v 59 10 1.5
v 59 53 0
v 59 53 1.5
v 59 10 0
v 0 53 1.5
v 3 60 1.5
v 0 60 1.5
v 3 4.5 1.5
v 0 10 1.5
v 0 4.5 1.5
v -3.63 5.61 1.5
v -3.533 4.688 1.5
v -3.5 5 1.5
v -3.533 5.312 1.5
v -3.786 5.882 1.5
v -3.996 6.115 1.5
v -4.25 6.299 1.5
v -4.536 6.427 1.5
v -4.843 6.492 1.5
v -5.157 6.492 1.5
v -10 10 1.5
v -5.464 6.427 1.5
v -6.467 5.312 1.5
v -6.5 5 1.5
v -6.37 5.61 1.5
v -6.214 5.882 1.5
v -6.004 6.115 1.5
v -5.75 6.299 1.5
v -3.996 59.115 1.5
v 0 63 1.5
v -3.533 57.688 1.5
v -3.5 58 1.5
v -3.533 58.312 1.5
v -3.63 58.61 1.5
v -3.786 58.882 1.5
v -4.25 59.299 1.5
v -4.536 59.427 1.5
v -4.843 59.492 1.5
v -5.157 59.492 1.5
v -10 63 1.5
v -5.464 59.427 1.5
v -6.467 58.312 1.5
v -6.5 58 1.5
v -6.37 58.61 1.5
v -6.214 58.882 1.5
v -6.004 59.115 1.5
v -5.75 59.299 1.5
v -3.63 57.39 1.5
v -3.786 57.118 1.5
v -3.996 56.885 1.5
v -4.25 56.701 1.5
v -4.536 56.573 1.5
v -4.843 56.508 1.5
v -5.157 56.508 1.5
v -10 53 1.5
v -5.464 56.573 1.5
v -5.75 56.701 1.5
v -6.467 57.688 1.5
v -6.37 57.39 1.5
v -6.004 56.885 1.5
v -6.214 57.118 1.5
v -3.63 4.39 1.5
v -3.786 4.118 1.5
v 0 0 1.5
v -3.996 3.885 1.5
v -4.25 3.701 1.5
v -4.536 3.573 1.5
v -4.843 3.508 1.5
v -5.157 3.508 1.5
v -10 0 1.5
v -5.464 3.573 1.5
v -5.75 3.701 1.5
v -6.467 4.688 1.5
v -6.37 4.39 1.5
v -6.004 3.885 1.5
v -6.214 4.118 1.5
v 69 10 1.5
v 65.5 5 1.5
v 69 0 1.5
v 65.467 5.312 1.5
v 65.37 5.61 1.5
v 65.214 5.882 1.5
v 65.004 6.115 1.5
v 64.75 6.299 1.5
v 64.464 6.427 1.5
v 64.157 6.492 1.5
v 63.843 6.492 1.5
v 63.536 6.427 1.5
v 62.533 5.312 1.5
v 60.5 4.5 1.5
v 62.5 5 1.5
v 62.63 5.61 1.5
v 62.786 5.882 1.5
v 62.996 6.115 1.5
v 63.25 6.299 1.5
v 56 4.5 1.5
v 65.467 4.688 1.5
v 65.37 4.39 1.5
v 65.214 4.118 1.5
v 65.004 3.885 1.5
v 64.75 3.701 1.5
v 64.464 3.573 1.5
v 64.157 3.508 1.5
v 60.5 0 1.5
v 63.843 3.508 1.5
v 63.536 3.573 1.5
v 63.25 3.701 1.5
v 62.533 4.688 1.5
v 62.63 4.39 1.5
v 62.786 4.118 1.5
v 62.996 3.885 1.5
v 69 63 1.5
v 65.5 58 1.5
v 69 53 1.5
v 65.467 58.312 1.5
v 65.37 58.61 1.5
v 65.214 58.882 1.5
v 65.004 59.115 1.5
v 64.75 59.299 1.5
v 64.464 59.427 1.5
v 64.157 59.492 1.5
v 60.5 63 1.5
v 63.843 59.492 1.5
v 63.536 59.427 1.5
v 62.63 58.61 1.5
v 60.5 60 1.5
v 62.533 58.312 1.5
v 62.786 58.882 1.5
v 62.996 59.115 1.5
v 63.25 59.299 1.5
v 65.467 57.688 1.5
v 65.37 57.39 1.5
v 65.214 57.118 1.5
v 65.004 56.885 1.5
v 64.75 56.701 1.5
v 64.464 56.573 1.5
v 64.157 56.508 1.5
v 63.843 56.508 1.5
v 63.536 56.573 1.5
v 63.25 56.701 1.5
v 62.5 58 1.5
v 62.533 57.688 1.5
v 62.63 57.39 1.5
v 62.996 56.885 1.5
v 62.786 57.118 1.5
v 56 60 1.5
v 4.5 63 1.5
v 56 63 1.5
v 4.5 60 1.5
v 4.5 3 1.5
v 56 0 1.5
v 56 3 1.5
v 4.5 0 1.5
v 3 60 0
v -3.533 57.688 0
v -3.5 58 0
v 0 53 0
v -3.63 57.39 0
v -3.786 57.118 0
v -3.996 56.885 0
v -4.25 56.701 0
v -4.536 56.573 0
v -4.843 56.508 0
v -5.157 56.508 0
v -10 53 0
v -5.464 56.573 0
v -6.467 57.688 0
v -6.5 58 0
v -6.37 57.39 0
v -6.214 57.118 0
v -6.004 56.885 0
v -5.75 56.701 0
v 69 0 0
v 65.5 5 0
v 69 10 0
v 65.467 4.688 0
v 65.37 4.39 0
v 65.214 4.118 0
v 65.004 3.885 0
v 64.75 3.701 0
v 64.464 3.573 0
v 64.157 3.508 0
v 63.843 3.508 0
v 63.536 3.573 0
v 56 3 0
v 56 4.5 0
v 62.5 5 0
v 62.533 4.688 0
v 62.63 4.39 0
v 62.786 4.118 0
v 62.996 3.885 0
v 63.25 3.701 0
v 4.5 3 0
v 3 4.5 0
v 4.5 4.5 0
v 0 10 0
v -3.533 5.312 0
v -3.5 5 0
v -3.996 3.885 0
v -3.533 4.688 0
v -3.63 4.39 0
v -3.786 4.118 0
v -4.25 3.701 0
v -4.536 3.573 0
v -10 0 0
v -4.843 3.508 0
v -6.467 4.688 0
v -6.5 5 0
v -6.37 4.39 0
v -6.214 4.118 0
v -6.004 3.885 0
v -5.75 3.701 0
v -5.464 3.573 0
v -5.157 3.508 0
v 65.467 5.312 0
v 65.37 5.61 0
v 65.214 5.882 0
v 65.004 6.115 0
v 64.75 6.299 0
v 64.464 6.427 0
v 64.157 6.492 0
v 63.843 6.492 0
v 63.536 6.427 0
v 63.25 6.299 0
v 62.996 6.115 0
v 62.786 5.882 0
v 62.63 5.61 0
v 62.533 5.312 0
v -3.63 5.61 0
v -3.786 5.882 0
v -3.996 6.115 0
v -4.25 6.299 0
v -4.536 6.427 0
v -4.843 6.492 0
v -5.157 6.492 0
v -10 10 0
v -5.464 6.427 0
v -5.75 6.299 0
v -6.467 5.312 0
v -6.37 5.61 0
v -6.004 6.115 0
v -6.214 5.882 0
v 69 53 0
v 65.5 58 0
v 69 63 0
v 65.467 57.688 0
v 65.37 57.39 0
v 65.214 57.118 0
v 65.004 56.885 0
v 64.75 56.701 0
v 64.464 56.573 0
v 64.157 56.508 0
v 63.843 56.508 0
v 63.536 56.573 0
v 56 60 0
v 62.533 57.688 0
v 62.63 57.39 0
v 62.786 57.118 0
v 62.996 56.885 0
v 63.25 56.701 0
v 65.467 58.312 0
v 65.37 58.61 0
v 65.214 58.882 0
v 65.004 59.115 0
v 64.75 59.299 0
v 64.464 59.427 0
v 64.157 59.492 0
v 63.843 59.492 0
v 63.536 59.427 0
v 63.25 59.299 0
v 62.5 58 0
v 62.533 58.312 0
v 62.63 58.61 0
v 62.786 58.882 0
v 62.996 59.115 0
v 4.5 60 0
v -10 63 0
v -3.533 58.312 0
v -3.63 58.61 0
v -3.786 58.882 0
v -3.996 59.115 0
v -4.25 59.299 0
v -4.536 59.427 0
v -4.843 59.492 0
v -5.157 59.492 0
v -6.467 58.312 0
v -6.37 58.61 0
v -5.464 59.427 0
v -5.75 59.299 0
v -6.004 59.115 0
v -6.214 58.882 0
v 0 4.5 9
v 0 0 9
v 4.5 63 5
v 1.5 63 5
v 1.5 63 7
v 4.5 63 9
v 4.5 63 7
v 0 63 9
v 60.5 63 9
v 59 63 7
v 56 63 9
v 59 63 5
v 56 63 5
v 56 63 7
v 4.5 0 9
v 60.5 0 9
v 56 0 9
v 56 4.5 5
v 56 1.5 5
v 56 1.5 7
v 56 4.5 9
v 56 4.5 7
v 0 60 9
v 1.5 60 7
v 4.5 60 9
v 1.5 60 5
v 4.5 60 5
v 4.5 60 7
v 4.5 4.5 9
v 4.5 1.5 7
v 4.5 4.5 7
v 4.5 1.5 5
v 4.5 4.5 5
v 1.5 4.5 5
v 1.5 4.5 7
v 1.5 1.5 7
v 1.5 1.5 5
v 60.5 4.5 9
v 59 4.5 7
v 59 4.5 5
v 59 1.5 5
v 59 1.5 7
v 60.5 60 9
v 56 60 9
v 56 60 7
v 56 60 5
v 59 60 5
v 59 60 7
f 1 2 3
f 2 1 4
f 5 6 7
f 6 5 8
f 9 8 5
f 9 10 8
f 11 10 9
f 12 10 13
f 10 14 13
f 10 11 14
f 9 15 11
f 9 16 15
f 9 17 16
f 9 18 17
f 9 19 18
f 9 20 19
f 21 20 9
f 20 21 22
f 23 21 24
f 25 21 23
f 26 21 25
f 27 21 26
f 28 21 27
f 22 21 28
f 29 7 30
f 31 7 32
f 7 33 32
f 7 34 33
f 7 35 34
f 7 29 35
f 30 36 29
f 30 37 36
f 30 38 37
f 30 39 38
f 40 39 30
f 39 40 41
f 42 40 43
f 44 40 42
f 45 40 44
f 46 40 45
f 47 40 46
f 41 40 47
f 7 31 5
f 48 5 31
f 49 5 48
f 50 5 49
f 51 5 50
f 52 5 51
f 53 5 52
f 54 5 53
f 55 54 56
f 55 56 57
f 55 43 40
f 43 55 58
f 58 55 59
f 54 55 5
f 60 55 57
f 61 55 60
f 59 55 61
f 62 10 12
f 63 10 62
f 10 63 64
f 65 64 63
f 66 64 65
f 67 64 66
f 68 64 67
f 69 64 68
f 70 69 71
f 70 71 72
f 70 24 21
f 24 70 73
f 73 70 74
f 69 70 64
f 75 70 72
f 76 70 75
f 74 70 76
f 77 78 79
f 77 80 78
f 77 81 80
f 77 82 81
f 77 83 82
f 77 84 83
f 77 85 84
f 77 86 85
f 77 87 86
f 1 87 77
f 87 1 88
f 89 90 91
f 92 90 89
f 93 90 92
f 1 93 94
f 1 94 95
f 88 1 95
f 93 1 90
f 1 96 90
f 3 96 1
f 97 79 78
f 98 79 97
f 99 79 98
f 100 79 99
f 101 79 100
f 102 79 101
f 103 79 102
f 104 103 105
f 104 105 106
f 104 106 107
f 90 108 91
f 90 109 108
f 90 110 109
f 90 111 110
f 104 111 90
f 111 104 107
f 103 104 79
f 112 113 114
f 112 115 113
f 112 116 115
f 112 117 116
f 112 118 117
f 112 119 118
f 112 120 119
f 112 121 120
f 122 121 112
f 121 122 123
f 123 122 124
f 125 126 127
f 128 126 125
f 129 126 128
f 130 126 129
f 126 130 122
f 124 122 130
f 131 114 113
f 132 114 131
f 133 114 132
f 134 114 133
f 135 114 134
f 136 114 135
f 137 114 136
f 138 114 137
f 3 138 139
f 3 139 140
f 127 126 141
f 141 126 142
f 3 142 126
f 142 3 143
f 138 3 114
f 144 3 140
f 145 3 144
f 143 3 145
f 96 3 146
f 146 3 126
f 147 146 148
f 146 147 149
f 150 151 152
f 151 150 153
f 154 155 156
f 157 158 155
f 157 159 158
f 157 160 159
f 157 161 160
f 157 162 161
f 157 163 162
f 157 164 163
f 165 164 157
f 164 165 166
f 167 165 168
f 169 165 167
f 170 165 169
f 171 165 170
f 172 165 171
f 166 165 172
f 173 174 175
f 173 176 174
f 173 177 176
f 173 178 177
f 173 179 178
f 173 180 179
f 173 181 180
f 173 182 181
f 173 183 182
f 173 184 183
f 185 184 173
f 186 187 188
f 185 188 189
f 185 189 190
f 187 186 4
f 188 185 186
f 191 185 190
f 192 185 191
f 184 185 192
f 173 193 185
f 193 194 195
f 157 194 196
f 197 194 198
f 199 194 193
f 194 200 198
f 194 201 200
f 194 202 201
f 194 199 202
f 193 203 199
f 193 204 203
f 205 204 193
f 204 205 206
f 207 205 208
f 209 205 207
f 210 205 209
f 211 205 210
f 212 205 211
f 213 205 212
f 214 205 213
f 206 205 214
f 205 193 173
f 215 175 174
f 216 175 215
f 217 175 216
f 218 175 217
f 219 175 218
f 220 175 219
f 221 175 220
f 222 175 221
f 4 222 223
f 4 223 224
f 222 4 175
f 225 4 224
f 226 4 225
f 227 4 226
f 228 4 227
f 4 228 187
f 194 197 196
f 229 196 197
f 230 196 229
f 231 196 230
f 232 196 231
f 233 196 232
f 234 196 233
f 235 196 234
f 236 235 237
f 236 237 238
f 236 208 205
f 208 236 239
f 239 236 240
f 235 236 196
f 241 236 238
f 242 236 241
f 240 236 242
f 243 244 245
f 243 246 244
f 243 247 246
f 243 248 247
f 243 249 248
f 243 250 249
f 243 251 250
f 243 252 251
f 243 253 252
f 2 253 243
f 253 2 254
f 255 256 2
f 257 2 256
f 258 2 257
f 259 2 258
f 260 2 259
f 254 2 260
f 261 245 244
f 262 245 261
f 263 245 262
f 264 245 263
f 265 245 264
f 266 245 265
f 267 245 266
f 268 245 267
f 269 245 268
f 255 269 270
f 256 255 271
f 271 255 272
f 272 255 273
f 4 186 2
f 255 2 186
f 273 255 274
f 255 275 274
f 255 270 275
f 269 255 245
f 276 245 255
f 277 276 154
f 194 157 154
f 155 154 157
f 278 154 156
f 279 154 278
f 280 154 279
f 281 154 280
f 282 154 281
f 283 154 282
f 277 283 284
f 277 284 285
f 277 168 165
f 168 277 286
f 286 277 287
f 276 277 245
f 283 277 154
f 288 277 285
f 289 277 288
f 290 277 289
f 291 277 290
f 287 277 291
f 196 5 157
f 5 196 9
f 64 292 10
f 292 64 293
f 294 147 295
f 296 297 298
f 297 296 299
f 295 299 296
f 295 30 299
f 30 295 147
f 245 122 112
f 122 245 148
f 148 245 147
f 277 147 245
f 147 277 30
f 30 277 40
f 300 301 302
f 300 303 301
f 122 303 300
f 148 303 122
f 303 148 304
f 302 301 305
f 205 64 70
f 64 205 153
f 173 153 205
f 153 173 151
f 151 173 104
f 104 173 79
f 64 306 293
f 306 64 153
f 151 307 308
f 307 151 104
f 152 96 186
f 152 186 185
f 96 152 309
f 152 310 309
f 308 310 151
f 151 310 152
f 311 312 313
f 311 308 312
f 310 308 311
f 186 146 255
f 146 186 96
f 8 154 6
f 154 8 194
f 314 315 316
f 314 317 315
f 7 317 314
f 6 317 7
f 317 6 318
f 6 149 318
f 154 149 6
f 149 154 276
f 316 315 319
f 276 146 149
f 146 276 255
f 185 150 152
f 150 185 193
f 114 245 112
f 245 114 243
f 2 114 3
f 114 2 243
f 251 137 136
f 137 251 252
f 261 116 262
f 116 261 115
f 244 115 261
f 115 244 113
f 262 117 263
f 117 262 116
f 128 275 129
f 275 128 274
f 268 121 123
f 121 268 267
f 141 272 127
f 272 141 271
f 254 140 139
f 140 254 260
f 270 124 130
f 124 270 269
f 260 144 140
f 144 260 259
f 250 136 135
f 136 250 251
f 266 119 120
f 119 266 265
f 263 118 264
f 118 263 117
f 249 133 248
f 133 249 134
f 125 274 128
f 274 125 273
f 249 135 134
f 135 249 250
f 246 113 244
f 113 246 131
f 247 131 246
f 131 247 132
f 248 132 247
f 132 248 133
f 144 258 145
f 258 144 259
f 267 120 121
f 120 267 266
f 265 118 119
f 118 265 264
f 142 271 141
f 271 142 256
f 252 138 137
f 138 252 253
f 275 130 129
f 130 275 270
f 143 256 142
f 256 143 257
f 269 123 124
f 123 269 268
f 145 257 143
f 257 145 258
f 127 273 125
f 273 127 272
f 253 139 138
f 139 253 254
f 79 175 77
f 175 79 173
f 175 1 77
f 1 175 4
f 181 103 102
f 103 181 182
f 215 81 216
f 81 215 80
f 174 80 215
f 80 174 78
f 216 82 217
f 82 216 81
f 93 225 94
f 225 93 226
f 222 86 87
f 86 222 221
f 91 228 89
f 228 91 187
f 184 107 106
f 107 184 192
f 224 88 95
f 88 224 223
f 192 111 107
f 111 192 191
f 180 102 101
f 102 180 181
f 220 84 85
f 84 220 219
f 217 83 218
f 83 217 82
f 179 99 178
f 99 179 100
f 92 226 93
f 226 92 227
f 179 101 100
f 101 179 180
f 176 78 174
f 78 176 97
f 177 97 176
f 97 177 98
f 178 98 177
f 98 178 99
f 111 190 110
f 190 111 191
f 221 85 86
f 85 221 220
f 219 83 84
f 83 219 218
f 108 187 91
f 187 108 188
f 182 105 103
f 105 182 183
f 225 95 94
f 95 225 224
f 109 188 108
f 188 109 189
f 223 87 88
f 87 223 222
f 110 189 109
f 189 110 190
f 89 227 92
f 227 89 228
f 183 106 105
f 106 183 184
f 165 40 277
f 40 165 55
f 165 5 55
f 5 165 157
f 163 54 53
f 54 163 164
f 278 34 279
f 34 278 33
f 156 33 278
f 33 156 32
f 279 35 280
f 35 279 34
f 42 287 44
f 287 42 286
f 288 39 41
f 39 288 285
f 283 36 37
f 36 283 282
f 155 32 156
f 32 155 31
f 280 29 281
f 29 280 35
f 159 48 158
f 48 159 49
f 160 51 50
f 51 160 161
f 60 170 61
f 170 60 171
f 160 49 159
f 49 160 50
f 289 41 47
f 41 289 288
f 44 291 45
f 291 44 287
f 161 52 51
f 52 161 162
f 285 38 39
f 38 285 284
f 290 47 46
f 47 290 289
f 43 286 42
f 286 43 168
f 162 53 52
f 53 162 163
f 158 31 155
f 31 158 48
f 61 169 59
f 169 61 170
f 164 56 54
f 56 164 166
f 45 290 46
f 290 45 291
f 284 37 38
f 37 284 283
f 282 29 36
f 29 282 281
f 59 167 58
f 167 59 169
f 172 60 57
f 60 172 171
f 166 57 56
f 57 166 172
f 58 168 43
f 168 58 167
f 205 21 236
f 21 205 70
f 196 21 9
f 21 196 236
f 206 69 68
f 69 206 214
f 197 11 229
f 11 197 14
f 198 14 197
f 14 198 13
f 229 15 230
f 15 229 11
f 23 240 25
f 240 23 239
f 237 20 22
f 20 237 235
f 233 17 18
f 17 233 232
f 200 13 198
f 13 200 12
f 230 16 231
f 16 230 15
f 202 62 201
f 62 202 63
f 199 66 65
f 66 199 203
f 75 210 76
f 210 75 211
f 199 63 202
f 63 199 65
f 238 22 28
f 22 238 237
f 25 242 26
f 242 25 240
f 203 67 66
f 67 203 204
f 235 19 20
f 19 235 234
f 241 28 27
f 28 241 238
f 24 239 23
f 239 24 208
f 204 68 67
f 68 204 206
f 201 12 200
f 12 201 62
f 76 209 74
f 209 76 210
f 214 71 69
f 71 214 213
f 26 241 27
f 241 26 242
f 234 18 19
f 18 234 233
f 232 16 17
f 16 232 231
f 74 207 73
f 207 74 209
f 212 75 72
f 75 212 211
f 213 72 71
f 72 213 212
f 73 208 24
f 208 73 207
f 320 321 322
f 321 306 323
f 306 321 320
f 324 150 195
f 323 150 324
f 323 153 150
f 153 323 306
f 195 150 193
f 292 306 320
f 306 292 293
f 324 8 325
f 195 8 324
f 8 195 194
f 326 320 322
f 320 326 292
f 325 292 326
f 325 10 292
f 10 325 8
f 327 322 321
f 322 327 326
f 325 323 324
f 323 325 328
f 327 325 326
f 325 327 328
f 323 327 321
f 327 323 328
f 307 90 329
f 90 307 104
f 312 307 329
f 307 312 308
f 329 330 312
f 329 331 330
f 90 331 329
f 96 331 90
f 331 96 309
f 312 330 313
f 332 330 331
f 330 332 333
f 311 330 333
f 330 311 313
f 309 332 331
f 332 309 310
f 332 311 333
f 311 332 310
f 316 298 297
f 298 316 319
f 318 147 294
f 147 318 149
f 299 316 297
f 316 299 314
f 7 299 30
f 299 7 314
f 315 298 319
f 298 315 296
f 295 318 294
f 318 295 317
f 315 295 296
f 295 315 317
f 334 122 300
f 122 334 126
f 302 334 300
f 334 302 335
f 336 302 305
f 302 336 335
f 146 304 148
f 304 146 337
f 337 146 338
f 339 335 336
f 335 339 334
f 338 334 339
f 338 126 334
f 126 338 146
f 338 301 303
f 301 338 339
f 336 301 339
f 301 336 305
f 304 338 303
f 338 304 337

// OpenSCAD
Wall=3;
Thickness=1.5;
Height=61.5+1.5;
Length=56+3;
$fs = 0.01;
difference () {
cube([Length,Height,Thickness]);
translate([Wall, Wall, 0]) cube([Length-Wall*2,Height-Wall*2,2]);
}
difference () {
  translate([Length,Height-10,0]) cube([10,10,Thickness]);
  translate([Length+5,Height+5-10,0]) cylinder(Thickness,1.5,1.5);
}

difference () {
  translate([Length,0,0]) cube([10,10,Thickness]);
  translate([Length+5,5,0]) cylinder(Thickness,1.5,1.5);
}

difference () {
  translate([-10,Height-10,0]) cube([10,10,Thickness]);
  translate([-10+5,Height-5,0]) cylinder(Thickness,1.5,1.5);
}

difference () {
  translate([-10,0,0]) cube([10,10,Thickness]);
  #translate([-10+5,5,0]) cylinder(Thickness,1.5,1.5);
}


//Relays
module relay(xx, yy) {
    translate([xx,yy,0]) difference () {cube([4.5,4.5,9]); translate([1.5,1.5,5]) cube([3,3,2]);}
    translate([xx+56,yy,0]) difference () {cube([4.5,4.5,9]); translate([0,1.5,5]) cube([3,3,2]);}
    translate([xx,yy+61.5-1.5,0]) difference () {cube([4.5,3,9]); translate([1.5,0,5]) cube([3,5,2]);}
    translate([xx+56,yy+61.5-1.5,0]) difference () {cube([4.5,3,9]); translate([0,0,5]) cube([3,5,2]);}

}

relay(0,0);
